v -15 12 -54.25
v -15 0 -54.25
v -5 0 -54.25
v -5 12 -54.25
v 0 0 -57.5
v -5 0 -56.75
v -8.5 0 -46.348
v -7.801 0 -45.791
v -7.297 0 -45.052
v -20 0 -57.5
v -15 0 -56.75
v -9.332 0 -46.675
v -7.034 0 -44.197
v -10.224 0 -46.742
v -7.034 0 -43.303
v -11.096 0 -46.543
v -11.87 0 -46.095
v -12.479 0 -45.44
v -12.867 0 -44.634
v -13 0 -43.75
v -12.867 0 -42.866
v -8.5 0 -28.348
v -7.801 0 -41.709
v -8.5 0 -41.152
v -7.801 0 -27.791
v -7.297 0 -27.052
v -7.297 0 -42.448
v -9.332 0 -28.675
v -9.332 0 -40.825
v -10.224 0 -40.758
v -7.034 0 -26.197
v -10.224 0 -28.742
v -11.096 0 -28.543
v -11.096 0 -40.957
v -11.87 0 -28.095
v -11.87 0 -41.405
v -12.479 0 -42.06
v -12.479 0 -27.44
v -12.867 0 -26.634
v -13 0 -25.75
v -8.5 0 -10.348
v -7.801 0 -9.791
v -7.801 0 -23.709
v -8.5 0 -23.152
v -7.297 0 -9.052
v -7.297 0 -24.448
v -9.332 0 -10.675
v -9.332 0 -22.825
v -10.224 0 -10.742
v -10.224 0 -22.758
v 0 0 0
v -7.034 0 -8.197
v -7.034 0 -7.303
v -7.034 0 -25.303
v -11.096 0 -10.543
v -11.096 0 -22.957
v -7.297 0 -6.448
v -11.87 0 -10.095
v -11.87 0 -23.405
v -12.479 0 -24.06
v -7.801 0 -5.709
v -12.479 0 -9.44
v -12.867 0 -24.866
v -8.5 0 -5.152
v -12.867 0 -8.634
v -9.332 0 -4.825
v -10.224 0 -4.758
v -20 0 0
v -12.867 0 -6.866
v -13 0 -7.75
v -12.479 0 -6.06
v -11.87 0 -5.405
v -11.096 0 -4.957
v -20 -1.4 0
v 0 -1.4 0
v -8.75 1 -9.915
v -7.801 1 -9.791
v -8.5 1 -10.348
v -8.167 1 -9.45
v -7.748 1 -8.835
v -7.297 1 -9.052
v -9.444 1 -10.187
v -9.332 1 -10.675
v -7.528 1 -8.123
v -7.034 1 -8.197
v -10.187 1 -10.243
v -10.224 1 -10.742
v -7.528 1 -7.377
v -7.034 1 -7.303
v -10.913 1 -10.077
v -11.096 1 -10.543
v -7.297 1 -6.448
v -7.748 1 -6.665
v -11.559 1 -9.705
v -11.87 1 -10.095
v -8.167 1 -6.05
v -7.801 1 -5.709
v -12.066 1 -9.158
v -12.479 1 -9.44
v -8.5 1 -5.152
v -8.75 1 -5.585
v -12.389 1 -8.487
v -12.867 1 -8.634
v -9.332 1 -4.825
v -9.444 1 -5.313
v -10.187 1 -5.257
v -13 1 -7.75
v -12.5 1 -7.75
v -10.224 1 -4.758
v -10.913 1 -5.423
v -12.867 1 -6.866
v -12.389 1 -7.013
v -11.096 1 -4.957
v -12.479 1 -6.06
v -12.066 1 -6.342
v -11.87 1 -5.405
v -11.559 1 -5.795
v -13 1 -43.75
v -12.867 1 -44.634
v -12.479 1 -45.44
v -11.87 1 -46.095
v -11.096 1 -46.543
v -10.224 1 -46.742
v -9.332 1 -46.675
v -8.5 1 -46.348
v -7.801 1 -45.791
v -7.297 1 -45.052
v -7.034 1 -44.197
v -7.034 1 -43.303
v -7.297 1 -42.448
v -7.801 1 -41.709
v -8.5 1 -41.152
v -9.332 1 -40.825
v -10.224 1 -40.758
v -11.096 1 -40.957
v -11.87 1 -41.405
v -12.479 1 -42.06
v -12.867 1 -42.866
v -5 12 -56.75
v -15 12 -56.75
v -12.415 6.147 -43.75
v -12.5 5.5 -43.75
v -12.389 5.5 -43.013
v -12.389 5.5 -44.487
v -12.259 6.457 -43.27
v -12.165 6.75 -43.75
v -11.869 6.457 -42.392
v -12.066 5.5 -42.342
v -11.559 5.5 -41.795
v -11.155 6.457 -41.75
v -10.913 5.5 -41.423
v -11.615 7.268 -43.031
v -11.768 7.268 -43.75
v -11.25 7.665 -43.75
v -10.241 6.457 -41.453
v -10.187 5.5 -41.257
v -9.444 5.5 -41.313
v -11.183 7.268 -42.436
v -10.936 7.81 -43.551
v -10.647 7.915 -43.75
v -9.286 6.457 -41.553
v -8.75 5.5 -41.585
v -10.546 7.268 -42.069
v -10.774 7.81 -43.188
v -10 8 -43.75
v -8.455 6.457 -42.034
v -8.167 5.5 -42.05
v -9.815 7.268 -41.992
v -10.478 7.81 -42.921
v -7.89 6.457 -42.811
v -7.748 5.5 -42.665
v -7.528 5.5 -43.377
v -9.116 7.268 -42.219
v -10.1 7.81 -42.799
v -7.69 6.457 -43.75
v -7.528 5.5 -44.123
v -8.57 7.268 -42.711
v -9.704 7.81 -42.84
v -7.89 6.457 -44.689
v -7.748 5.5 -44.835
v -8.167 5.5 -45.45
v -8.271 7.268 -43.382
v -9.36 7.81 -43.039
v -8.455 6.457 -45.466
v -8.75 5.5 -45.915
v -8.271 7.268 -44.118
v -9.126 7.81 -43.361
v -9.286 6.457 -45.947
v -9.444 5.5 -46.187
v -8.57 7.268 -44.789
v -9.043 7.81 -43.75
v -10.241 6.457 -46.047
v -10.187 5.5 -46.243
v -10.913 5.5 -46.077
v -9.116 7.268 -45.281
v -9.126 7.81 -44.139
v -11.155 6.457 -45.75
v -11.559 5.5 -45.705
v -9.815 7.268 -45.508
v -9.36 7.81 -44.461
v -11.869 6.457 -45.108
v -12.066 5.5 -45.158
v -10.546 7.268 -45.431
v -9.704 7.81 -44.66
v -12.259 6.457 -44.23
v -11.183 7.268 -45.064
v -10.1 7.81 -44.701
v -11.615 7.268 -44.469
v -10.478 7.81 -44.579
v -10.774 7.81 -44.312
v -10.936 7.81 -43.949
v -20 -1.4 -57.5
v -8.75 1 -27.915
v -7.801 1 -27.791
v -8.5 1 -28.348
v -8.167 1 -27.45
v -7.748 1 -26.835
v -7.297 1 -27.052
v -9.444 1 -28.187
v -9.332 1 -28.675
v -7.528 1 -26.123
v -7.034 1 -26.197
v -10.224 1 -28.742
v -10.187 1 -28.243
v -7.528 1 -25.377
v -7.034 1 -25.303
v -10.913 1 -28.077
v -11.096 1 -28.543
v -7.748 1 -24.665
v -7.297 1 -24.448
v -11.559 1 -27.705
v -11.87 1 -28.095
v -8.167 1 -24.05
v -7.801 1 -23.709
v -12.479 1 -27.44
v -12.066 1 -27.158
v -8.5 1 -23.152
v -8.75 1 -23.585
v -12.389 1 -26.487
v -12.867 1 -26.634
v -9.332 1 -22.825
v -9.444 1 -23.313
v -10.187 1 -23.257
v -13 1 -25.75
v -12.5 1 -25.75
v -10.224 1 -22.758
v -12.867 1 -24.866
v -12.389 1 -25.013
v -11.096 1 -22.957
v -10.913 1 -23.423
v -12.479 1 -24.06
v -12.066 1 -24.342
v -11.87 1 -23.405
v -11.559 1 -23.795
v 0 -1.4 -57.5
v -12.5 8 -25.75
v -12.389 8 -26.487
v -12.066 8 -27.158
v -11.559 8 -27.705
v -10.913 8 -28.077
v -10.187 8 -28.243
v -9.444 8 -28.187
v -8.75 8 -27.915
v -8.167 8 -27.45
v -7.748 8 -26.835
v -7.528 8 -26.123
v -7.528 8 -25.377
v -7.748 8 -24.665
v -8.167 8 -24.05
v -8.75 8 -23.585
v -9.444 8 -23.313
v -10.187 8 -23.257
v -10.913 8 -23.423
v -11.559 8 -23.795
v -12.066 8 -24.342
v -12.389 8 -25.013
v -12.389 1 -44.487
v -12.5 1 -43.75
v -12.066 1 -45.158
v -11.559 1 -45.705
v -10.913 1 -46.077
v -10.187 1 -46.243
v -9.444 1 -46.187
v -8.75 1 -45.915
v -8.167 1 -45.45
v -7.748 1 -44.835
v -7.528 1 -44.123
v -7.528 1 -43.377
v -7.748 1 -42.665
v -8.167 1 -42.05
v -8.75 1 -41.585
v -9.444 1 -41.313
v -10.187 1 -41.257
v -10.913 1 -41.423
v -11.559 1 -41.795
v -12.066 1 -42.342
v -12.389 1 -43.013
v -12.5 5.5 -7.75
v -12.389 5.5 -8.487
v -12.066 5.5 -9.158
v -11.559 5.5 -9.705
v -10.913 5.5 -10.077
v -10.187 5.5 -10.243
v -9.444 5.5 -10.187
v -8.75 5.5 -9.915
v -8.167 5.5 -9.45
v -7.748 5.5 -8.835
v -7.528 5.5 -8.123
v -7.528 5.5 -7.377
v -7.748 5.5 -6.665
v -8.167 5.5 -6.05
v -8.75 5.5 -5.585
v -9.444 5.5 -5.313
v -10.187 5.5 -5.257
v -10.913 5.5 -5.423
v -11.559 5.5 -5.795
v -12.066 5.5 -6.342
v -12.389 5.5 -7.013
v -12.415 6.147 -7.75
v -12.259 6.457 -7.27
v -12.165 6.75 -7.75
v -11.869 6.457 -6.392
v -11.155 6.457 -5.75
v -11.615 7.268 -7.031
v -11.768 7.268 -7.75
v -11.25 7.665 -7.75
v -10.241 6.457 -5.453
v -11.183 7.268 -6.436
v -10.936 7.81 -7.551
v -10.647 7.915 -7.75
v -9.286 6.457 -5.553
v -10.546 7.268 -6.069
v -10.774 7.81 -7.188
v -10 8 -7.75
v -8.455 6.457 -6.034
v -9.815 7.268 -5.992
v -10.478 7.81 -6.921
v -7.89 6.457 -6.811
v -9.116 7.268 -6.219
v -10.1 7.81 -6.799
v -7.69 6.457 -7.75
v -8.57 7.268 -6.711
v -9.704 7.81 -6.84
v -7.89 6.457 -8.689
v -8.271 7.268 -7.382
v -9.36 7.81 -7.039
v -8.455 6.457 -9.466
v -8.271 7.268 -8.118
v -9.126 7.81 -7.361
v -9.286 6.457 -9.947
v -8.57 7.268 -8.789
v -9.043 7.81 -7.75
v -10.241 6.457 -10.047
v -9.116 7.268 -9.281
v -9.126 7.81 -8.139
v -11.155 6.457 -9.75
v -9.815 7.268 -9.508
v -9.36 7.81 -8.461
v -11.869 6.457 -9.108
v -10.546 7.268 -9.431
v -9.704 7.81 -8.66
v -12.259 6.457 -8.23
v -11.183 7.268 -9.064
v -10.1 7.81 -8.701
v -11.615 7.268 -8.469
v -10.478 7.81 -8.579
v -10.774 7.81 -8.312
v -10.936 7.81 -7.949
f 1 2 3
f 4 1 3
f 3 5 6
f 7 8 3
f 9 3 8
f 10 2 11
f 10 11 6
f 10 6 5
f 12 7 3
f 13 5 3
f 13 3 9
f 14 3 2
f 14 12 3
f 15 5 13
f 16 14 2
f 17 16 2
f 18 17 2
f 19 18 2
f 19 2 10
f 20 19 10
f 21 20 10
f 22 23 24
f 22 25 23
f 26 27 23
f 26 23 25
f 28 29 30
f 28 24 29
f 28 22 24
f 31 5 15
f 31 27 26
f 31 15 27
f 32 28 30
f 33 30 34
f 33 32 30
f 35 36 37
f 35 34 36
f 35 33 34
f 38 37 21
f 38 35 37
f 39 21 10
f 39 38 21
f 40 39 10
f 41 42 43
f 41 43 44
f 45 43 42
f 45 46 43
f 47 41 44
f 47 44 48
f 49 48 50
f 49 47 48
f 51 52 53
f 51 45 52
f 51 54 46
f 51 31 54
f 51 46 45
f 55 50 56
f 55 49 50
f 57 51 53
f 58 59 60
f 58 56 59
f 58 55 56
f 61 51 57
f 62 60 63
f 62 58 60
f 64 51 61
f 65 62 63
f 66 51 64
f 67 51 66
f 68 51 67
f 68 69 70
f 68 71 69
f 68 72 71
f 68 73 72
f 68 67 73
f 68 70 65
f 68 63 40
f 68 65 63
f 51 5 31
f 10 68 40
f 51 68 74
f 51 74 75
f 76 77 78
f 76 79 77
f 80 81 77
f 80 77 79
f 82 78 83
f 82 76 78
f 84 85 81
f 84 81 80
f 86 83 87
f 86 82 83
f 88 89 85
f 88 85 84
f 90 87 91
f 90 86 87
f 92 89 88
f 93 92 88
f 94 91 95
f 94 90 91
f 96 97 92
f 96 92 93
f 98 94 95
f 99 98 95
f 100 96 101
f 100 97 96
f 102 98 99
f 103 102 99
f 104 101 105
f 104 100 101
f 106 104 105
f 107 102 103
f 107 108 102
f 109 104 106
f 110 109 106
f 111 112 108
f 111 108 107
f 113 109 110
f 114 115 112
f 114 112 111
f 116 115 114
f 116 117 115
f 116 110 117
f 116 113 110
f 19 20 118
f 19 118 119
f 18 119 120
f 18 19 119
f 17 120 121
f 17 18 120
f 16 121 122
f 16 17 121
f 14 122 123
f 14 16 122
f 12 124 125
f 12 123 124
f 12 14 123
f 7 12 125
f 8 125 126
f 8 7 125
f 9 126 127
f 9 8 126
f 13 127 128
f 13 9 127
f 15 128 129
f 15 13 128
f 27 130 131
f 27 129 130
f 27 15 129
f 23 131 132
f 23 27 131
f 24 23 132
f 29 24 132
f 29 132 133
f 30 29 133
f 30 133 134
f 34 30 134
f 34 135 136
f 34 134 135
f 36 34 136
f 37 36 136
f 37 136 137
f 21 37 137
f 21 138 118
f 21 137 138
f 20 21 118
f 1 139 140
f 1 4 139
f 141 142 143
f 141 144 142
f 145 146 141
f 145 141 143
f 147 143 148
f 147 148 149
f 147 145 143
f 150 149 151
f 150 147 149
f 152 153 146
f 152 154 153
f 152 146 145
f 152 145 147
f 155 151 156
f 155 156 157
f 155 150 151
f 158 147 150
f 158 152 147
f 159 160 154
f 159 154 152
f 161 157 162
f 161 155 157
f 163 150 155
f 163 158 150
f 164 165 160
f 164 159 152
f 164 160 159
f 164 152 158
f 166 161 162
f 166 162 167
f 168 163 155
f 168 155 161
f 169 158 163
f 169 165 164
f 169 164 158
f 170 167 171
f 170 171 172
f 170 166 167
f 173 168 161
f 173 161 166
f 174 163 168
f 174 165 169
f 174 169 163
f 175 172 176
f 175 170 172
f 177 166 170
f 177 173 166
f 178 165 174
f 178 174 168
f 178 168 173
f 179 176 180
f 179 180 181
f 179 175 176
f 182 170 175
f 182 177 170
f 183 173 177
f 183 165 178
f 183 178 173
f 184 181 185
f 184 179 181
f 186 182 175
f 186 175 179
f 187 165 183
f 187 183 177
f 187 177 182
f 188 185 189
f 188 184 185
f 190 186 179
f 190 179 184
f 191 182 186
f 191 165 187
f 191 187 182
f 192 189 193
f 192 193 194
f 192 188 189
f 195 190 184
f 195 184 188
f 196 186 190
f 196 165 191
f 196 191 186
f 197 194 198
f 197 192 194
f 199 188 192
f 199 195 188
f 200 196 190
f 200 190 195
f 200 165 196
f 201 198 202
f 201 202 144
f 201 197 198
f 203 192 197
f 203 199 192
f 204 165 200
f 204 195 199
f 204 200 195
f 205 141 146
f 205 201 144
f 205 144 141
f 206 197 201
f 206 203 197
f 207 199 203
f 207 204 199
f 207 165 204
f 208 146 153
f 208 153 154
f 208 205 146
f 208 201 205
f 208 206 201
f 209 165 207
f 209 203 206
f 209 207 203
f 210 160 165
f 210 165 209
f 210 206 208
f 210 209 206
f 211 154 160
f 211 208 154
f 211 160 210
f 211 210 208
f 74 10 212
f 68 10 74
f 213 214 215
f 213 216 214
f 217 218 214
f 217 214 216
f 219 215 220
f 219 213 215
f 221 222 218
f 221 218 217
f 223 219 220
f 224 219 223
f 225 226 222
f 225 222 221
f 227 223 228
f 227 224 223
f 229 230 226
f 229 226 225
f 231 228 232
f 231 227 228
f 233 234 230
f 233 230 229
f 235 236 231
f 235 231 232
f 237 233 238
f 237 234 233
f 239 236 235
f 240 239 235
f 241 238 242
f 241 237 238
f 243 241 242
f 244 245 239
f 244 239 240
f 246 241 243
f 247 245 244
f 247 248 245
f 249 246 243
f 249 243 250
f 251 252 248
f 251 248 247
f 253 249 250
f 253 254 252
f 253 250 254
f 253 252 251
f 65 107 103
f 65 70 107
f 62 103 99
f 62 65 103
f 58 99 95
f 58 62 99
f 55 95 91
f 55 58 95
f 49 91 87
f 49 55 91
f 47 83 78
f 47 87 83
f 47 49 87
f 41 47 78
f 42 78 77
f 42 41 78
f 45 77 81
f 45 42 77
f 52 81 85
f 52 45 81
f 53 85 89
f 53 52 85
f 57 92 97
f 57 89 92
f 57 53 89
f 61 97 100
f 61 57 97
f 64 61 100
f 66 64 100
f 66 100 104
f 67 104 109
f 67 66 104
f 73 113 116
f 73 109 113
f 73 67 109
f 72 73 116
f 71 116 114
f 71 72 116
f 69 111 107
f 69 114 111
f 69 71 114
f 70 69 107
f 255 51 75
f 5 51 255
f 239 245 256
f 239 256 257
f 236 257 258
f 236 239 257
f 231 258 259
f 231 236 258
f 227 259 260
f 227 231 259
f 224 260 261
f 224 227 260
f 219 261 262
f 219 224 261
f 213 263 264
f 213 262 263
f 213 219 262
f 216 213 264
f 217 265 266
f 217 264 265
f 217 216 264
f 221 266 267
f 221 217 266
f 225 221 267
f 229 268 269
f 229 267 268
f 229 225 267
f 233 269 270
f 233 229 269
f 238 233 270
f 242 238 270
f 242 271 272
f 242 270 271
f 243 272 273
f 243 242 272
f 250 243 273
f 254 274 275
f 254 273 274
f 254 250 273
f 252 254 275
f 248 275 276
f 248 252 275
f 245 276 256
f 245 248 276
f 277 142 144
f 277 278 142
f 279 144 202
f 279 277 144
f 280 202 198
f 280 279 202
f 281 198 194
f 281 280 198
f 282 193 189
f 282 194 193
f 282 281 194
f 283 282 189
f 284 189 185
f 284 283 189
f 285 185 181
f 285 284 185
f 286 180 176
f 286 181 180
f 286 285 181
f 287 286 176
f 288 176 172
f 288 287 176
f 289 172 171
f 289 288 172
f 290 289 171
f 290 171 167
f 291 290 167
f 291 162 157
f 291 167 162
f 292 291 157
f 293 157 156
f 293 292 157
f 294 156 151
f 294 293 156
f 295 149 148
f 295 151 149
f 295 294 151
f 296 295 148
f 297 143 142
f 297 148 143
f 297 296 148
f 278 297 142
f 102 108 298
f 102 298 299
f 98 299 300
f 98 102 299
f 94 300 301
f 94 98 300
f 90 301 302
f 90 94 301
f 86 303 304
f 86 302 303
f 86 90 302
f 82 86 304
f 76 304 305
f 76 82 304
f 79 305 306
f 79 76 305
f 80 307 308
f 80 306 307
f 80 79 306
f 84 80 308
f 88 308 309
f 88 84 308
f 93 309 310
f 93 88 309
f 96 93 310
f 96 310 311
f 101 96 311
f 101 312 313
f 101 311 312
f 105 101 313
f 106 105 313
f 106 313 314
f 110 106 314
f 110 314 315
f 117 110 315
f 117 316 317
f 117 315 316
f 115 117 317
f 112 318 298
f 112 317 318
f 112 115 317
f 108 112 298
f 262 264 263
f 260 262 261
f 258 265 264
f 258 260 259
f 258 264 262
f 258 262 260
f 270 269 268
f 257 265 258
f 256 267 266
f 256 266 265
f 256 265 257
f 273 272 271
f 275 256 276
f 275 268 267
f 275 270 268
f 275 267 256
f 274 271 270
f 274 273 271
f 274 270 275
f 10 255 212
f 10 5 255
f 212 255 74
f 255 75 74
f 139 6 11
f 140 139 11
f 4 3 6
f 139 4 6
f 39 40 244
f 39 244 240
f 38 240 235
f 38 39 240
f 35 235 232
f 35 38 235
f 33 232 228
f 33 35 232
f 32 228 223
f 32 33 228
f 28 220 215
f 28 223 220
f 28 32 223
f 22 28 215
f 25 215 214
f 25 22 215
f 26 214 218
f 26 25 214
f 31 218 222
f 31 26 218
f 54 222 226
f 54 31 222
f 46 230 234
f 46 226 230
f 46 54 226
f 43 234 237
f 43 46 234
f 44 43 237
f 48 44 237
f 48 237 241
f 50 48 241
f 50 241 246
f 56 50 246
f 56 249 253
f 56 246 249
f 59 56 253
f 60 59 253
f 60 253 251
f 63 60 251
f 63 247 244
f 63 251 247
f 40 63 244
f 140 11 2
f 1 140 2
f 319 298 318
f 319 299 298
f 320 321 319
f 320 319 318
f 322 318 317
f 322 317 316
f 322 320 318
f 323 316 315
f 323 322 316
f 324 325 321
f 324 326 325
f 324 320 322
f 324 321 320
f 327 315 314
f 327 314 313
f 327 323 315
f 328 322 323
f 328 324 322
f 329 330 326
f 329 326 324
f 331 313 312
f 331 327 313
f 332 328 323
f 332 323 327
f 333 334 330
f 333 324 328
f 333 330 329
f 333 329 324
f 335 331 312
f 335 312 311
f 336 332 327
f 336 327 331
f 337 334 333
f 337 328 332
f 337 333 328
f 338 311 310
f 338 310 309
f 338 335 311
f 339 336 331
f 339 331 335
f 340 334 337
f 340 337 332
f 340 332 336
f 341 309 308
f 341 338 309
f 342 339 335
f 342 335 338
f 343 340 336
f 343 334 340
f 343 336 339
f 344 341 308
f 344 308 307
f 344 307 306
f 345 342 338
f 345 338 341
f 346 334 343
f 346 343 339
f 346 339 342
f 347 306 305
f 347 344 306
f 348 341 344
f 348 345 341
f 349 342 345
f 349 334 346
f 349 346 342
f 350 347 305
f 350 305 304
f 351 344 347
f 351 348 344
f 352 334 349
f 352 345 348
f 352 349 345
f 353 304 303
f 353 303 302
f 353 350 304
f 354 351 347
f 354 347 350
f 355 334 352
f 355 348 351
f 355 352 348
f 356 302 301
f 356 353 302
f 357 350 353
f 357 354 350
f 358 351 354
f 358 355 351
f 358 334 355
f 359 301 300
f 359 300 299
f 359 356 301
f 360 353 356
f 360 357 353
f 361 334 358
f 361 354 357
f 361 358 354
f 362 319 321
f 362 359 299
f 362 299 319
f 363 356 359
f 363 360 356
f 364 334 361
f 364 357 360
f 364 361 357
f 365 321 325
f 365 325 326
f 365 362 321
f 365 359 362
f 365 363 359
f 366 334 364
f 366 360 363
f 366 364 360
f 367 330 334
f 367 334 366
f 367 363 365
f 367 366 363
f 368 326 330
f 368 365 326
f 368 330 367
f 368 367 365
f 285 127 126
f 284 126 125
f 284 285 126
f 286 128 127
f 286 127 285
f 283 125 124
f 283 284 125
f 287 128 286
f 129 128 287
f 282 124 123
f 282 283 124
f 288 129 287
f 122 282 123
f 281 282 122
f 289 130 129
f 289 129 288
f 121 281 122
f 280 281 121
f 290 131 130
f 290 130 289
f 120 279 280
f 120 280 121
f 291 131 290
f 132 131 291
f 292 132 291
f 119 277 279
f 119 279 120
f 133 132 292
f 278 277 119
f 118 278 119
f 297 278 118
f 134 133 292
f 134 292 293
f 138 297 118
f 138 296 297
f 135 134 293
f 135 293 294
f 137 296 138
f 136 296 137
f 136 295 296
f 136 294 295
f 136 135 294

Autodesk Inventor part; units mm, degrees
ref_plane "YZ Plane" through (0, 0, 0) normal (1, 0, 0) x (0, 1, 0)
ref_plane "XZ Plane" through (0, 0, 0) normal (0, 1, 0) x (-1, 0, 0)
ref_plane "XY Plane" through (0, 0, 0) normal (0, 0, 1) x (1, 0, 0)
sketch "Sketch1" plane through (0, 0, 0) normal (0, 1, 0) x (-1, 0, 0)
  line L0 (20, 0) -> (0, 0)
  line L1 (0, 0) -> (0, -57.5)
  line L2 (0, -57.5) -> (20, -57.5)
  line L3 (20, -57.5) -> (20, 0)
  circle A0 centre (10, -7.75) radius 2.5
  circle A1 centre (10, -25.75) radius 2.5
  circle A2 centre (10, -43.75) radius 2.5
  line L4 (15, -54.25) -> (5, -54.25)
  line L5 (5, -54.25) -> (5, -56.75)
  line L6 (5, -56.75) -> (15, -56.75)
  line L7 (15, -56.75) -> (15, -54.25)
  circle A3 centre (10, -7.75) radius 3
  circle A4 centre (10, -25.75) radius 3
  circle A5 centre (10, -43.75) radius 3
  dimension "d0" = 57.5
  dimension "d1" = 20
  dimension "d2" = 5
  dimension "d3" = 5
  dimension "d4" = 5
  dimension "d8" = 0.75
  dimension "d9" = 2.5
  dimension "d10" = 10
  dimension "d20" = 10
  dimension "d21" = 5
  dimension "d22" = 6
  dimension "d23" = 6
  dimension "d24" = 6
  dimension "d45" = 7.75
  dimension "d46" = 18
  dimension "d47" = 18
extrude "Extrusion1" add sketch "Sketch1" against normal blind 1.4 contours L3 L2 L1 L0 | A0 | A1 | A2 | L7 L6 L5 L4 | A3 | A4 | A5
extrude "Extrusion2" add sketch "Sketch1" along normal blind 12 contours L7 L6 L5 L4
extrude "Extrusion5" add sketch "Sketch1" along normal blind 8 contours A0
extrude "Extrusion6" add sketch "Sketch1" along normal blind 1 contours A3
fillet "Fillet4" radius 2.5 1 edges at (-7.5, 8, -7.75)
extrude "Extrusion7" add sketch "Sketch1" along normal blind 1 contours A4
extrude "Extrusion8" add sketch "Sketch1" along normal blind 8 contours A1
fillet "Fillet5" [suppressed]
extrude "Extrusion9" add sketch "Sketch1" along normal blind 8 contours A2
extrude "Extrusion10" add sketch "Sketch1" along normal blind 1 contours A5
fillet "Fillet6" radius 2.5 1 edges at (-7.5, 8, -43.75)
sketch "Sketch2" plane through (-10, 8, -25.75) normal (0, 1, 0) x (1, 0, 0)
  point P0 (10, -25.75)
  point P1 (0, 0)
properties part number "Led_Board_V1"
